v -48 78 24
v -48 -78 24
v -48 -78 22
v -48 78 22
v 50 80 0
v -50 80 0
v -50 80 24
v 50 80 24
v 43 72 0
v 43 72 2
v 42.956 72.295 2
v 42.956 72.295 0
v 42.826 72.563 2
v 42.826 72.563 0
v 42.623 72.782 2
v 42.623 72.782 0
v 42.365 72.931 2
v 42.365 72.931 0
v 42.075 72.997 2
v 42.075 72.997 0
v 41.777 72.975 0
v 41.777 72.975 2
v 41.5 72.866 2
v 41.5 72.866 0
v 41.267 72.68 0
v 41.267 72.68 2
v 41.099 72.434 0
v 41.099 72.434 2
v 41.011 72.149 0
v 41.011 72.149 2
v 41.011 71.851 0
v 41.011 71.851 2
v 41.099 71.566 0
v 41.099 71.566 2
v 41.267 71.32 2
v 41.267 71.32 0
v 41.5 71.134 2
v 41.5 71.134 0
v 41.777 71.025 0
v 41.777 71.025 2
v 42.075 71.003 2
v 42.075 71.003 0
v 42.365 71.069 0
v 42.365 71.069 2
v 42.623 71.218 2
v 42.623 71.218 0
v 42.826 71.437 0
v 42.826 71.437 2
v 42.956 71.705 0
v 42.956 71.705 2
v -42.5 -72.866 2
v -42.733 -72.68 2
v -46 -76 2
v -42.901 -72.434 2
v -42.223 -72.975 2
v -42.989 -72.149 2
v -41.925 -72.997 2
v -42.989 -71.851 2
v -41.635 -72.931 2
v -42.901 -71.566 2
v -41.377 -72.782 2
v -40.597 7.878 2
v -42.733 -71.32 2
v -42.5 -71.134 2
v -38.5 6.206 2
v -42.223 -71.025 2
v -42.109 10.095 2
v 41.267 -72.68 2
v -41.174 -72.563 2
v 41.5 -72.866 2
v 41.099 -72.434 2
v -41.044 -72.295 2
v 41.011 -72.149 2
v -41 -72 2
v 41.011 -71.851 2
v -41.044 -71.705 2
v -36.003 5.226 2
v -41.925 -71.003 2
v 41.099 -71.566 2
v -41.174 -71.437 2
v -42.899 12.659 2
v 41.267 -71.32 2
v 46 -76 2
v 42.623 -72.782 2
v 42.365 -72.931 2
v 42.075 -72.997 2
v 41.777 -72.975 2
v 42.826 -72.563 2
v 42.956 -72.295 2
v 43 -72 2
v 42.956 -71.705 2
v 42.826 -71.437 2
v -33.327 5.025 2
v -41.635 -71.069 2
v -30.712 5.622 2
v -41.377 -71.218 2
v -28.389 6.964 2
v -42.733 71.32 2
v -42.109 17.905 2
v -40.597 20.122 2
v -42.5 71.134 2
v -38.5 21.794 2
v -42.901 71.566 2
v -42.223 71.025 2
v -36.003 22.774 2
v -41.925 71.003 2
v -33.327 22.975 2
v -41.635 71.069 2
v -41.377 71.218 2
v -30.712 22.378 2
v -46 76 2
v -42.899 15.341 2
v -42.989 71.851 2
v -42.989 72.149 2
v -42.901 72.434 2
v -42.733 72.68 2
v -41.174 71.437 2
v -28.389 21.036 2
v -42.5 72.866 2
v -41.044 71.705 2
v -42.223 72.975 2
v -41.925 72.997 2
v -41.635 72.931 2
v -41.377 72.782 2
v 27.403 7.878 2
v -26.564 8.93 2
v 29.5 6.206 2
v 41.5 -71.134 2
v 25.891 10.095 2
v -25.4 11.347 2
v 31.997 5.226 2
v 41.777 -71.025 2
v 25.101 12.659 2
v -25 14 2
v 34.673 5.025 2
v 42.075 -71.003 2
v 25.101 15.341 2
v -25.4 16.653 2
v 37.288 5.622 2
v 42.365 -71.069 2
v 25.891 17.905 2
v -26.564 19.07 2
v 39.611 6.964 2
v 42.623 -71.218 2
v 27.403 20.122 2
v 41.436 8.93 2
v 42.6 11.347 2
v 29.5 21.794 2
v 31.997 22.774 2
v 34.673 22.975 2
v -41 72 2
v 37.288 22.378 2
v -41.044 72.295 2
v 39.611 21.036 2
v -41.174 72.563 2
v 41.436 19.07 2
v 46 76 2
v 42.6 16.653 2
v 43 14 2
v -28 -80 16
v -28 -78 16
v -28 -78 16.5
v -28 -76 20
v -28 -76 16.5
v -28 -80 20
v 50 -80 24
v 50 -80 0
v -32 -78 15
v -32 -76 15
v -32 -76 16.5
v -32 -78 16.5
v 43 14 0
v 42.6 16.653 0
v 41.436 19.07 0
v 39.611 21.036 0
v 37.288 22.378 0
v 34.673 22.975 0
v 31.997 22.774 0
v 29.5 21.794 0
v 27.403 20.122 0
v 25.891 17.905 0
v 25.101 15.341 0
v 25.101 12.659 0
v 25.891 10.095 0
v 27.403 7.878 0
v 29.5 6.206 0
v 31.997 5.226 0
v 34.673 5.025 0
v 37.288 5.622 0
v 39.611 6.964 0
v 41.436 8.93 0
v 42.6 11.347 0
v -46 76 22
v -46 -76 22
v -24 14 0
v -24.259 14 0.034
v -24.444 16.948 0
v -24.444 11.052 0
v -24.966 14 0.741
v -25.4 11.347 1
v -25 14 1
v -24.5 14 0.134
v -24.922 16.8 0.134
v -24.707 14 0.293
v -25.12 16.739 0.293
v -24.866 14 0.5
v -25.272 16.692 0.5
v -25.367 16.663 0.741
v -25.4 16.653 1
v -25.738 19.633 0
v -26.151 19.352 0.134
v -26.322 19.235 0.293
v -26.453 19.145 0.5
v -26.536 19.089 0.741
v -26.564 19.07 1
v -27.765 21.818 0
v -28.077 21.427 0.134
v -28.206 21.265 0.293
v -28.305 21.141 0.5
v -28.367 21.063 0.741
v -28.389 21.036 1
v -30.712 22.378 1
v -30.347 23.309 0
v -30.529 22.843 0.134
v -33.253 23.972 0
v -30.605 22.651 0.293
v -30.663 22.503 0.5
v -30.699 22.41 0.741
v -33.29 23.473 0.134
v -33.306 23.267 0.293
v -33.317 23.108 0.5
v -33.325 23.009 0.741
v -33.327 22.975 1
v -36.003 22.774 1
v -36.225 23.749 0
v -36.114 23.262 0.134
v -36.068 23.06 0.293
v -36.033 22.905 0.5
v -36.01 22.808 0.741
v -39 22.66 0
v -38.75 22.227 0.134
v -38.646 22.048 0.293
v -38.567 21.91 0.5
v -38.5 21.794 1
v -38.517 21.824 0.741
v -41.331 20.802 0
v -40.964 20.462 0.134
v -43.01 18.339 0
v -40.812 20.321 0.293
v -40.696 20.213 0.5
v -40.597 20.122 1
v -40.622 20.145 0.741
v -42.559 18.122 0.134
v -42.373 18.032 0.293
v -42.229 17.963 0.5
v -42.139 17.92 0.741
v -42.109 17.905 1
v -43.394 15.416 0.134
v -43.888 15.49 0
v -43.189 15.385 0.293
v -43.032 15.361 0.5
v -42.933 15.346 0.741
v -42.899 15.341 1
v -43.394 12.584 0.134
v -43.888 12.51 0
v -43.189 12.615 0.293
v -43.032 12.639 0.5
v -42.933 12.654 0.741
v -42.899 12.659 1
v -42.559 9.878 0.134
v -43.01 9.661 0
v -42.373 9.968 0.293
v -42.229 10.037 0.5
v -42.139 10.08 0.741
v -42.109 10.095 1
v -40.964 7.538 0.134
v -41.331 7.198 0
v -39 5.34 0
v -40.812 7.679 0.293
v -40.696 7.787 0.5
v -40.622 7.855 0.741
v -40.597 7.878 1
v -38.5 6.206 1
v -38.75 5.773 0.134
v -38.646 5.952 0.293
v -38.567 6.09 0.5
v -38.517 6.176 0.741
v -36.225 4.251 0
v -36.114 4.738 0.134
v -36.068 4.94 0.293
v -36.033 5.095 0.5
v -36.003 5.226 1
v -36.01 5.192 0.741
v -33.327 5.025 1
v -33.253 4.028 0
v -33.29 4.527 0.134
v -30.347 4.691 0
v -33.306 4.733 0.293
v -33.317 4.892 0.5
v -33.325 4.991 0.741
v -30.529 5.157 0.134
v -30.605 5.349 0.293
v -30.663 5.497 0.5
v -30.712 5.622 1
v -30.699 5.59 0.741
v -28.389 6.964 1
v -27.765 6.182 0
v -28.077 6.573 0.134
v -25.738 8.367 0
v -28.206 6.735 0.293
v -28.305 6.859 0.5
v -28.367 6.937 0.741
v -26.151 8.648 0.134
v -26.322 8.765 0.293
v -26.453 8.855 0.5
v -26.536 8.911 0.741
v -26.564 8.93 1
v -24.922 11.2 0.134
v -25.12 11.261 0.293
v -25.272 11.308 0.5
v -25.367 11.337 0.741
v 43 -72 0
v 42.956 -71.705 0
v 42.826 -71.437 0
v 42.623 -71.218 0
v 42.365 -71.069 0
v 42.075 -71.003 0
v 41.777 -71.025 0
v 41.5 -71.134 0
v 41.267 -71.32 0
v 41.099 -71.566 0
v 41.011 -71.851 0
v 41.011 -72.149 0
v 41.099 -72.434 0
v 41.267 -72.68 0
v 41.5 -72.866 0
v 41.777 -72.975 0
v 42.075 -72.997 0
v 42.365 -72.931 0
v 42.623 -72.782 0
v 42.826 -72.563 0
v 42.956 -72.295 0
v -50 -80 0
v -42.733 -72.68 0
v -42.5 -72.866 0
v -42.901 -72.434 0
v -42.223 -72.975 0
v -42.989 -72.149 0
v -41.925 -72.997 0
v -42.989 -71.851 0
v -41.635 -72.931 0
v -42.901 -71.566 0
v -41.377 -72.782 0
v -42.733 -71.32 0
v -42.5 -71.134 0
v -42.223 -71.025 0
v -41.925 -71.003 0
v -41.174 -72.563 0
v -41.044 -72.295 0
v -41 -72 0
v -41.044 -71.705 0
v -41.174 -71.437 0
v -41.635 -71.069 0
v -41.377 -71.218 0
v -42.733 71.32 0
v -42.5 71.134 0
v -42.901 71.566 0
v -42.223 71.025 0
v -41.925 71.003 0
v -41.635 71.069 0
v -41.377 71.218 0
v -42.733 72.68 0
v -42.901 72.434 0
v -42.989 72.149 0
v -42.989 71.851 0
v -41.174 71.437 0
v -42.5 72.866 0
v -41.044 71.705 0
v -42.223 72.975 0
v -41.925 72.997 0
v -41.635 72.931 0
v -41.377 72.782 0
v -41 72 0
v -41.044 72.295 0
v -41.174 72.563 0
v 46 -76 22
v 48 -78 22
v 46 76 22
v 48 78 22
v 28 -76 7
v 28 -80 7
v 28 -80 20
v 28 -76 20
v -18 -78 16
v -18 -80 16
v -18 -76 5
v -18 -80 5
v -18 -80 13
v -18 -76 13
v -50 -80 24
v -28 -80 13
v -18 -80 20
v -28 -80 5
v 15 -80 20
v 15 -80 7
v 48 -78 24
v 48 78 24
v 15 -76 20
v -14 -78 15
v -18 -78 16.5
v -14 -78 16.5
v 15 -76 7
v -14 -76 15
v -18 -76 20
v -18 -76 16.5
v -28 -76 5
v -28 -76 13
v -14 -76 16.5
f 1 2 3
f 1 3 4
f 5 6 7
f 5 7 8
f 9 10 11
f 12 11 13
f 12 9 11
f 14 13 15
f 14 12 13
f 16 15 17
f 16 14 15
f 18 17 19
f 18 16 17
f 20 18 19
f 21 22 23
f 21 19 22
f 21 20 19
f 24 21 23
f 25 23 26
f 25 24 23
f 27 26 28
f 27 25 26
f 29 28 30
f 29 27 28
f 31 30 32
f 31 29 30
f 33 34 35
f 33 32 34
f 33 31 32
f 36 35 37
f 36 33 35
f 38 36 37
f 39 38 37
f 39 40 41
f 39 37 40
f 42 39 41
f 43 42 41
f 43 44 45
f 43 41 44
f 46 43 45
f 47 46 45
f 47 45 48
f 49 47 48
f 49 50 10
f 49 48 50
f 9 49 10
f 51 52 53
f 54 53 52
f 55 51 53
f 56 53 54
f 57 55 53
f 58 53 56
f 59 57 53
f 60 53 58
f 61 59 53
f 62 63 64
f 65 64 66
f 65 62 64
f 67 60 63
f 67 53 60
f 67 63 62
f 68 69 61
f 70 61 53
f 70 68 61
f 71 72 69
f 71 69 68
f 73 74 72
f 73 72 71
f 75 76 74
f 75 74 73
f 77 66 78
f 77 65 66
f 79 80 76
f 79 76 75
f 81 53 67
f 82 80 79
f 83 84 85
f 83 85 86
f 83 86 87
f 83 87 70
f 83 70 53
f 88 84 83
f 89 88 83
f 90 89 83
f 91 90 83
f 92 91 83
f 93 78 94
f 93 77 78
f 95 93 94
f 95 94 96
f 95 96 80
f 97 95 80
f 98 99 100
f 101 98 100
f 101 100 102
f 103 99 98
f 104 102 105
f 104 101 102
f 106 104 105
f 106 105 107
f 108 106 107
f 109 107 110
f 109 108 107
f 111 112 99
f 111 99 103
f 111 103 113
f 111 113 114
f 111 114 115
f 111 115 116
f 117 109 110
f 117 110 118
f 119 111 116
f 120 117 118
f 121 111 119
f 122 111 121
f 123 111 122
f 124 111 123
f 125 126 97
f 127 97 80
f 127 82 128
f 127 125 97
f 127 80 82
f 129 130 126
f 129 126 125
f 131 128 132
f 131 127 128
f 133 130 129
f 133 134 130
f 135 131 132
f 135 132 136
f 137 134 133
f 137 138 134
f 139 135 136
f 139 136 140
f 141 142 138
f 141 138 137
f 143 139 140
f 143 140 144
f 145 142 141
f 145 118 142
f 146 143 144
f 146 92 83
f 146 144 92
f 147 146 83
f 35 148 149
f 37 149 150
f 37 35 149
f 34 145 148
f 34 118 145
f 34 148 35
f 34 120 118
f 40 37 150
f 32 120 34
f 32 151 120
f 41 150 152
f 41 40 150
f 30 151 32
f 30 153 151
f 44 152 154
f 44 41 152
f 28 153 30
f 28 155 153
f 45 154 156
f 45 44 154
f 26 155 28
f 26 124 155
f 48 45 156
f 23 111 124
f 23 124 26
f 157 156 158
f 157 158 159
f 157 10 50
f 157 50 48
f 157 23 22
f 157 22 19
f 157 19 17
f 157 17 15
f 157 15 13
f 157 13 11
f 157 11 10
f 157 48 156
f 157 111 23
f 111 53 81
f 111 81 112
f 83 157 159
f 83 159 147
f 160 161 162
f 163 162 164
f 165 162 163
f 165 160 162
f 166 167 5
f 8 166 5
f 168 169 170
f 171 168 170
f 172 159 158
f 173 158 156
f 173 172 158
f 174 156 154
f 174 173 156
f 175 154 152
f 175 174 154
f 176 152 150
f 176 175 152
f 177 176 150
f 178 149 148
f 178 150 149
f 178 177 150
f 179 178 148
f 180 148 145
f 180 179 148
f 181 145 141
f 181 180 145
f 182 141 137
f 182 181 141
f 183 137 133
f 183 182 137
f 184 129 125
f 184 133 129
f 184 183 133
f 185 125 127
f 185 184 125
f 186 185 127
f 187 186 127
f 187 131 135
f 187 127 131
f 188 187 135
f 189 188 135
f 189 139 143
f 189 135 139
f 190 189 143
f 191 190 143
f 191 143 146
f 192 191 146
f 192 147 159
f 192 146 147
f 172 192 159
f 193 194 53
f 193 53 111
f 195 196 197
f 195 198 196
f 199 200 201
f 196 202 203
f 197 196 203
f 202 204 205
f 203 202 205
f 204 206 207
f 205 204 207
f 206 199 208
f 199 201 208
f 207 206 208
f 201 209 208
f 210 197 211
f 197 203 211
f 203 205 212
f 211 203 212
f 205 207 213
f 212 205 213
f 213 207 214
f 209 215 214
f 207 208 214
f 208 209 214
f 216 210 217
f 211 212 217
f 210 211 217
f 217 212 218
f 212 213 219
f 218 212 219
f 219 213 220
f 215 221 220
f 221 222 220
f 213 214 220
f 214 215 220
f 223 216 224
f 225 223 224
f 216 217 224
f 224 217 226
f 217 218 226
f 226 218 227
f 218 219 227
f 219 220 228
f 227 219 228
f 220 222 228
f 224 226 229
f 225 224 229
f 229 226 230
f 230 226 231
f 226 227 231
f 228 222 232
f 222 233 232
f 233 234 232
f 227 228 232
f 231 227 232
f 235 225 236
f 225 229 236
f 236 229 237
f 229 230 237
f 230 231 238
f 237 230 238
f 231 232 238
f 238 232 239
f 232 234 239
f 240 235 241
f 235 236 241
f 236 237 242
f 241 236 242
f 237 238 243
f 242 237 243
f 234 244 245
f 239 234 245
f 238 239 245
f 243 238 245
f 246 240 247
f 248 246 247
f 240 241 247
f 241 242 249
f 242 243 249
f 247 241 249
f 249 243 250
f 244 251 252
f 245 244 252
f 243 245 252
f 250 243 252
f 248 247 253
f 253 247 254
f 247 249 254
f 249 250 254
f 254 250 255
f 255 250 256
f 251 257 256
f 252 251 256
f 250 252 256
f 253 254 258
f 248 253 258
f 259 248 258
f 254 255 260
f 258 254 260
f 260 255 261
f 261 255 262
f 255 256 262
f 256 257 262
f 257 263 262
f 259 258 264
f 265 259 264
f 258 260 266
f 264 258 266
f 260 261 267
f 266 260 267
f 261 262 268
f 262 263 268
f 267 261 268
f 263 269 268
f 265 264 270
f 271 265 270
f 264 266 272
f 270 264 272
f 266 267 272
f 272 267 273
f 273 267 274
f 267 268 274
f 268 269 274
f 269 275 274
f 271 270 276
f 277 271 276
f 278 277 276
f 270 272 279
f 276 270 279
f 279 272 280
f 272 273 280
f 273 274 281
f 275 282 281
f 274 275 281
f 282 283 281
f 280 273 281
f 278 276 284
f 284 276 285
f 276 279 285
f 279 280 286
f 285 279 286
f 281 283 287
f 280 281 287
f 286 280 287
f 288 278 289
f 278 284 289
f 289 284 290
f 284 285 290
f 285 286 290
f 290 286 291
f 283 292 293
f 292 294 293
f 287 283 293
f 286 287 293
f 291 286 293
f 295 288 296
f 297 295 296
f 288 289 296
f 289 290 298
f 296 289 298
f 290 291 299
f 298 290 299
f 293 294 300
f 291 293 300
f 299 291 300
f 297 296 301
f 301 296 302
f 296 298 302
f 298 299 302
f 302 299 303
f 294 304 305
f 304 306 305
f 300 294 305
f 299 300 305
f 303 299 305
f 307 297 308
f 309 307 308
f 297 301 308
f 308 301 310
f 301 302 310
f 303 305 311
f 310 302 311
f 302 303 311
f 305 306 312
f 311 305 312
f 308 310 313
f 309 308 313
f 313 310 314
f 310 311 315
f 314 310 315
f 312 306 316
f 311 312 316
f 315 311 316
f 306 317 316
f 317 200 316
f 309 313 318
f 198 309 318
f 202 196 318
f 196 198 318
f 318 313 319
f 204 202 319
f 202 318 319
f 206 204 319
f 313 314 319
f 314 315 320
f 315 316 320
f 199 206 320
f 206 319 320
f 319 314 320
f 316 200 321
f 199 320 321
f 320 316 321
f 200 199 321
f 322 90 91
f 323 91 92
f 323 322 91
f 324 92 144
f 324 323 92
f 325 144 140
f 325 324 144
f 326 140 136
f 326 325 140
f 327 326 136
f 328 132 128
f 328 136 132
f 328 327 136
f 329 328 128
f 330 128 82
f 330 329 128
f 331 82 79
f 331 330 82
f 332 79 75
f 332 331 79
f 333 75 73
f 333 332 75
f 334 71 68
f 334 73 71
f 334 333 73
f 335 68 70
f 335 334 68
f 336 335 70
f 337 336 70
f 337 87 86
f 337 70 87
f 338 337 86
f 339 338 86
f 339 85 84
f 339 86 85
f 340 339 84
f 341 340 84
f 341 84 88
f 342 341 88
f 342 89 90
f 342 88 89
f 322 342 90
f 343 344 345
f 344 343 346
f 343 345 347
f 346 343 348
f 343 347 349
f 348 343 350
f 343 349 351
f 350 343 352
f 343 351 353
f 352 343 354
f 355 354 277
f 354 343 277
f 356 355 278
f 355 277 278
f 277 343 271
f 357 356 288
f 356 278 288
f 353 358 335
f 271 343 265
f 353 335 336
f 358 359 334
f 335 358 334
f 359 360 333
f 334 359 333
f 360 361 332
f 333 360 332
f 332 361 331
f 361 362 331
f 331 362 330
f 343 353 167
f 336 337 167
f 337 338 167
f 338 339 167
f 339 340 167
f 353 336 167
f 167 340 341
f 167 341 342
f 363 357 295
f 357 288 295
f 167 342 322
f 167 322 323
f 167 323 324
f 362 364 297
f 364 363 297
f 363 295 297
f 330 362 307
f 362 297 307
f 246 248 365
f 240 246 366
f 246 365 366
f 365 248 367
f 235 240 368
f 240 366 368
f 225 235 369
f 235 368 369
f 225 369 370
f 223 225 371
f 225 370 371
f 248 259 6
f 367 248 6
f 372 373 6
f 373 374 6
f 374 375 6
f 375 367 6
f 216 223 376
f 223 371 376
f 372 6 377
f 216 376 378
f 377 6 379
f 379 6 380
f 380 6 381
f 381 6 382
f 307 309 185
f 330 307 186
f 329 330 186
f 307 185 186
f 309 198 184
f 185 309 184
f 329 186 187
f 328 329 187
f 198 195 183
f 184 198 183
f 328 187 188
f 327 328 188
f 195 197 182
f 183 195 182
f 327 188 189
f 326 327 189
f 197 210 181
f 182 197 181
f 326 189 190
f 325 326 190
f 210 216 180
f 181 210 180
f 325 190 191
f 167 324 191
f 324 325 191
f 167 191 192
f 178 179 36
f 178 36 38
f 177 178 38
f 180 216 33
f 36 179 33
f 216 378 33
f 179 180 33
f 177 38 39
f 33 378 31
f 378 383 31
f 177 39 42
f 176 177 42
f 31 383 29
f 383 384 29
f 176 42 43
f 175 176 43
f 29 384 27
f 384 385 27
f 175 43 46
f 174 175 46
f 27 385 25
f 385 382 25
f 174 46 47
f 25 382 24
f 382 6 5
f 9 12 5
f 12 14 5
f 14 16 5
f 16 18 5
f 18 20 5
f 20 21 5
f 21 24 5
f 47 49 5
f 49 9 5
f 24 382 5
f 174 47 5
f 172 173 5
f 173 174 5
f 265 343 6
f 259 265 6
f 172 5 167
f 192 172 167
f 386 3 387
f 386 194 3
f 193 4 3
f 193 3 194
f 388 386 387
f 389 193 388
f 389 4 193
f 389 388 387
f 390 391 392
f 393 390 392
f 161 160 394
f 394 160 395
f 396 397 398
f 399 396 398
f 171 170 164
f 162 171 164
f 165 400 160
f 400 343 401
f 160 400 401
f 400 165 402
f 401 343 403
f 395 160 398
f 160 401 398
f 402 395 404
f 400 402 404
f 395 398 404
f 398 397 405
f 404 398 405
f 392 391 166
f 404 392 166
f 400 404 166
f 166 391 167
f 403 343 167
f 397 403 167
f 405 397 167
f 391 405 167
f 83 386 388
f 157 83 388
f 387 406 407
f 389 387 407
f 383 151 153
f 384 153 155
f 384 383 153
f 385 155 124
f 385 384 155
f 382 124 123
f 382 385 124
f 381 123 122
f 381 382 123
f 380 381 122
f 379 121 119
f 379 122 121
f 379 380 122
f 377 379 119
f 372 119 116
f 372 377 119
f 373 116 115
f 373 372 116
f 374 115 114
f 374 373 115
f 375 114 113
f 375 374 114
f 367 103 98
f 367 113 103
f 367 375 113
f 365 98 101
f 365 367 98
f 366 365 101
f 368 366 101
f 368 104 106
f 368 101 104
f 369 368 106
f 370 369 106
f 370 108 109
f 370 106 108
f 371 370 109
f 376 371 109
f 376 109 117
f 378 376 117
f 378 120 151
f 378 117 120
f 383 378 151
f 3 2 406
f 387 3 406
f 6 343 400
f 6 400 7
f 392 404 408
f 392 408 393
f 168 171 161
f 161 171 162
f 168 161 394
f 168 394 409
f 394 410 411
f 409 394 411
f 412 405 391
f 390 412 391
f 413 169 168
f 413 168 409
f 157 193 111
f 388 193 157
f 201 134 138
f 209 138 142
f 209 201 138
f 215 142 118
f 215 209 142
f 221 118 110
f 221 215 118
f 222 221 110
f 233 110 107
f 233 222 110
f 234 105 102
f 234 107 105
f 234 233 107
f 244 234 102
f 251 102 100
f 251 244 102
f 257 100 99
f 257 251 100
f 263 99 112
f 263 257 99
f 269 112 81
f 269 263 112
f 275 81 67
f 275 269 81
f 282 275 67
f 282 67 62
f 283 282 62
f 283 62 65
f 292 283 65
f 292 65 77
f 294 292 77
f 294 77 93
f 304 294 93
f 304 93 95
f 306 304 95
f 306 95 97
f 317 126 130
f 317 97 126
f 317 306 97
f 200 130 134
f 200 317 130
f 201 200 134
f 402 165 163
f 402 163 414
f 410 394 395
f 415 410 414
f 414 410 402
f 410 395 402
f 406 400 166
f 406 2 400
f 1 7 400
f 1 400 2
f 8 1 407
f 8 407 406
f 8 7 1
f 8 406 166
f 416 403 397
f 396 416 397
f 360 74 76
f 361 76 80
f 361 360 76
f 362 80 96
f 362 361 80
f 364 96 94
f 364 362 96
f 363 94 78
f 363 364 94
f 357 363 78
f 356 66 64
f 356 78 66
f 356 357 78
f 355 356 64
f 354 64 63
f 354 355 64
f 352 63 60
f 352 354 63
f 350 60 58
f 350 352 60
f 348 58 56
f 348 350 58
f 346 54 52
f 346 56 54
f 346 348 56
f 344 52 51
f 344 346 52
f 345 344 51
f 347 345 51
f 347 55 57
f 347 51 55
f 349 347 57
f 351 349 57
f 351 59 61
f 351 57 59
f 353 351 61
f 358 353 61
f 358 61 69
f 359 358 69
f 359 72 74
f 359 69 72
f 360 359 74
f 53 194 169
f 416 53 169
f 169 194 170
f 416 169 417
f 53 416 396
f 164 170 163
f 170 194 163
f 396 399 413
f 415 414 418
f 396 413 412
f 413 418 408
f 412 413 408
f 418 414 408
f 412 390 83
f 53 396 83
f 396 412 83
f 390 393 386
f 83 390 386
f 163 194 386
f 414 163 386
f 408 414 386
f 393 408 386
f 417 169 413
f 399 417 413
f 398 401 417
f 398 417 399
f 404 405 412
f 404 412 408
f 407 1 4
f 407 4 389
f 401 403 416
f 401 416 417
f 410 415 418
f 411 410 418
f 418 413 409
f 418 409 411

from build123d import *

# Parameters (mm, degrees)
SKETCH_W        = 100
SKETCH_H        = 160
PAD_DEPTH       = 24
SKETCH001_W     = 96
SKETCH001_H     = 156
POCKET_DEPTH    = 2
SKETCH002_W     = 92
SKETCH002_H     = 152
POCKET001_DEPTH = 22
SKETCH003_R     = 1
POCKET002_DEPTH = 24.001
SKETCH004_W     = 13
SKETCH004_H     = 13
SKETCH004_W_2   = 10
SKETCH004_H_2   = 4
SKETCH004_H_3   = 8
POCKET003_DEPTH = 10
SKETCH005_W     = 18
SKETCH005_H     = 1.5
POCKET004_DEPTH = 2
SKETCH007_R     = 9
POCKET005_DEPTH = 5
FILLET_R        = 1


with BuildPart() as part:
    # Sketch → Pad (new body)
    with BuildSketch(Plane.XY):
        Rectangle(SKETCH_W, SKETCH_H)
    extrude(amount=PAD_DEPTH)

    # Sketch001 → Pocket (cut)
    with BuildSketch(Plane.XY.offset(24)):
        Rectangle(SKETCH001_W, SKETCH001_H)
    extrude(amount=-POCKET_DEPTH, mode=Mode.SUBTRACT)

    # Sketch002 → Pocket001 (cut)
    with BuildSketch(Plane.XY.offset(24)):
        Rectangle(SKETCH002_W, SKETCH002_H)
    extrude(amount=-POCKET001_DEPTH, mode=Mode.SUBTRACT)

    # Sketch003 → Pocket002 (cut, through all)
    with BuildSketch(Plane.XY):
        with Locations((42, 72)):
            Circle(SKETCH003_R)
        with Locations((-42, 72)):
            Circle(SKETCH003_R)
        with Locations((42, -72)):
            Circle(SKETCH003_R)
        with Locations((-42, -72)):
            Circle(SKETCH003_R)
    extrude(amount=POCKET002_DEPTH, mode=Mode.SUBTRACT)

    # Sketch004 → Pocket003 (cut)
    with BuildSketch(Plane.XZ.offset(80)):
        with Locations((21.5, 13.5)):
            Rectangle(SKETCH004_W, SKETCH004_H)
        with Locations((-23, 18)):
            Rectangle(SKETCH004_W_2, SKETCH004_H_2)
        with Locations((-23, 9)):
            Rectangle(SKETCH004_W_2, SKETCH004_H_3)
    extrude(amount=-POCKET003_DEPTH, mode=Mode.SUBTRACT)

    # Sketch005 → Pocket004 (cut)
    with BuildSketch(Plane.XZ.offset(76)):
        with Locations((-23, 15.75)):
            Rectangle(SKETCH005_W, SKETCH005_H)
    extrude(amount=POCKET004_DEPTH, mode=Mode.SUBTRACT)

    # Sketch007 → Pocket005 (cut)
    with BuildSketch(Plane.XY):
        with Locations((34, 14)):
            Circle(SKETCH007_R)
        with Locations((-34, 14)):
            Circle(SKETCH007_R)
    extrude(amount=POCKET005_DEPTH, mode=Mode.SUBTRACT)

    # Fillet
    fillet_edges = [part.edges().sort_by_distance(p)[0] for p in [
        (-43, 14, 0),
    ]]
    fillet(fillet_edges, radius=FILLET_R)


solid = part.part
